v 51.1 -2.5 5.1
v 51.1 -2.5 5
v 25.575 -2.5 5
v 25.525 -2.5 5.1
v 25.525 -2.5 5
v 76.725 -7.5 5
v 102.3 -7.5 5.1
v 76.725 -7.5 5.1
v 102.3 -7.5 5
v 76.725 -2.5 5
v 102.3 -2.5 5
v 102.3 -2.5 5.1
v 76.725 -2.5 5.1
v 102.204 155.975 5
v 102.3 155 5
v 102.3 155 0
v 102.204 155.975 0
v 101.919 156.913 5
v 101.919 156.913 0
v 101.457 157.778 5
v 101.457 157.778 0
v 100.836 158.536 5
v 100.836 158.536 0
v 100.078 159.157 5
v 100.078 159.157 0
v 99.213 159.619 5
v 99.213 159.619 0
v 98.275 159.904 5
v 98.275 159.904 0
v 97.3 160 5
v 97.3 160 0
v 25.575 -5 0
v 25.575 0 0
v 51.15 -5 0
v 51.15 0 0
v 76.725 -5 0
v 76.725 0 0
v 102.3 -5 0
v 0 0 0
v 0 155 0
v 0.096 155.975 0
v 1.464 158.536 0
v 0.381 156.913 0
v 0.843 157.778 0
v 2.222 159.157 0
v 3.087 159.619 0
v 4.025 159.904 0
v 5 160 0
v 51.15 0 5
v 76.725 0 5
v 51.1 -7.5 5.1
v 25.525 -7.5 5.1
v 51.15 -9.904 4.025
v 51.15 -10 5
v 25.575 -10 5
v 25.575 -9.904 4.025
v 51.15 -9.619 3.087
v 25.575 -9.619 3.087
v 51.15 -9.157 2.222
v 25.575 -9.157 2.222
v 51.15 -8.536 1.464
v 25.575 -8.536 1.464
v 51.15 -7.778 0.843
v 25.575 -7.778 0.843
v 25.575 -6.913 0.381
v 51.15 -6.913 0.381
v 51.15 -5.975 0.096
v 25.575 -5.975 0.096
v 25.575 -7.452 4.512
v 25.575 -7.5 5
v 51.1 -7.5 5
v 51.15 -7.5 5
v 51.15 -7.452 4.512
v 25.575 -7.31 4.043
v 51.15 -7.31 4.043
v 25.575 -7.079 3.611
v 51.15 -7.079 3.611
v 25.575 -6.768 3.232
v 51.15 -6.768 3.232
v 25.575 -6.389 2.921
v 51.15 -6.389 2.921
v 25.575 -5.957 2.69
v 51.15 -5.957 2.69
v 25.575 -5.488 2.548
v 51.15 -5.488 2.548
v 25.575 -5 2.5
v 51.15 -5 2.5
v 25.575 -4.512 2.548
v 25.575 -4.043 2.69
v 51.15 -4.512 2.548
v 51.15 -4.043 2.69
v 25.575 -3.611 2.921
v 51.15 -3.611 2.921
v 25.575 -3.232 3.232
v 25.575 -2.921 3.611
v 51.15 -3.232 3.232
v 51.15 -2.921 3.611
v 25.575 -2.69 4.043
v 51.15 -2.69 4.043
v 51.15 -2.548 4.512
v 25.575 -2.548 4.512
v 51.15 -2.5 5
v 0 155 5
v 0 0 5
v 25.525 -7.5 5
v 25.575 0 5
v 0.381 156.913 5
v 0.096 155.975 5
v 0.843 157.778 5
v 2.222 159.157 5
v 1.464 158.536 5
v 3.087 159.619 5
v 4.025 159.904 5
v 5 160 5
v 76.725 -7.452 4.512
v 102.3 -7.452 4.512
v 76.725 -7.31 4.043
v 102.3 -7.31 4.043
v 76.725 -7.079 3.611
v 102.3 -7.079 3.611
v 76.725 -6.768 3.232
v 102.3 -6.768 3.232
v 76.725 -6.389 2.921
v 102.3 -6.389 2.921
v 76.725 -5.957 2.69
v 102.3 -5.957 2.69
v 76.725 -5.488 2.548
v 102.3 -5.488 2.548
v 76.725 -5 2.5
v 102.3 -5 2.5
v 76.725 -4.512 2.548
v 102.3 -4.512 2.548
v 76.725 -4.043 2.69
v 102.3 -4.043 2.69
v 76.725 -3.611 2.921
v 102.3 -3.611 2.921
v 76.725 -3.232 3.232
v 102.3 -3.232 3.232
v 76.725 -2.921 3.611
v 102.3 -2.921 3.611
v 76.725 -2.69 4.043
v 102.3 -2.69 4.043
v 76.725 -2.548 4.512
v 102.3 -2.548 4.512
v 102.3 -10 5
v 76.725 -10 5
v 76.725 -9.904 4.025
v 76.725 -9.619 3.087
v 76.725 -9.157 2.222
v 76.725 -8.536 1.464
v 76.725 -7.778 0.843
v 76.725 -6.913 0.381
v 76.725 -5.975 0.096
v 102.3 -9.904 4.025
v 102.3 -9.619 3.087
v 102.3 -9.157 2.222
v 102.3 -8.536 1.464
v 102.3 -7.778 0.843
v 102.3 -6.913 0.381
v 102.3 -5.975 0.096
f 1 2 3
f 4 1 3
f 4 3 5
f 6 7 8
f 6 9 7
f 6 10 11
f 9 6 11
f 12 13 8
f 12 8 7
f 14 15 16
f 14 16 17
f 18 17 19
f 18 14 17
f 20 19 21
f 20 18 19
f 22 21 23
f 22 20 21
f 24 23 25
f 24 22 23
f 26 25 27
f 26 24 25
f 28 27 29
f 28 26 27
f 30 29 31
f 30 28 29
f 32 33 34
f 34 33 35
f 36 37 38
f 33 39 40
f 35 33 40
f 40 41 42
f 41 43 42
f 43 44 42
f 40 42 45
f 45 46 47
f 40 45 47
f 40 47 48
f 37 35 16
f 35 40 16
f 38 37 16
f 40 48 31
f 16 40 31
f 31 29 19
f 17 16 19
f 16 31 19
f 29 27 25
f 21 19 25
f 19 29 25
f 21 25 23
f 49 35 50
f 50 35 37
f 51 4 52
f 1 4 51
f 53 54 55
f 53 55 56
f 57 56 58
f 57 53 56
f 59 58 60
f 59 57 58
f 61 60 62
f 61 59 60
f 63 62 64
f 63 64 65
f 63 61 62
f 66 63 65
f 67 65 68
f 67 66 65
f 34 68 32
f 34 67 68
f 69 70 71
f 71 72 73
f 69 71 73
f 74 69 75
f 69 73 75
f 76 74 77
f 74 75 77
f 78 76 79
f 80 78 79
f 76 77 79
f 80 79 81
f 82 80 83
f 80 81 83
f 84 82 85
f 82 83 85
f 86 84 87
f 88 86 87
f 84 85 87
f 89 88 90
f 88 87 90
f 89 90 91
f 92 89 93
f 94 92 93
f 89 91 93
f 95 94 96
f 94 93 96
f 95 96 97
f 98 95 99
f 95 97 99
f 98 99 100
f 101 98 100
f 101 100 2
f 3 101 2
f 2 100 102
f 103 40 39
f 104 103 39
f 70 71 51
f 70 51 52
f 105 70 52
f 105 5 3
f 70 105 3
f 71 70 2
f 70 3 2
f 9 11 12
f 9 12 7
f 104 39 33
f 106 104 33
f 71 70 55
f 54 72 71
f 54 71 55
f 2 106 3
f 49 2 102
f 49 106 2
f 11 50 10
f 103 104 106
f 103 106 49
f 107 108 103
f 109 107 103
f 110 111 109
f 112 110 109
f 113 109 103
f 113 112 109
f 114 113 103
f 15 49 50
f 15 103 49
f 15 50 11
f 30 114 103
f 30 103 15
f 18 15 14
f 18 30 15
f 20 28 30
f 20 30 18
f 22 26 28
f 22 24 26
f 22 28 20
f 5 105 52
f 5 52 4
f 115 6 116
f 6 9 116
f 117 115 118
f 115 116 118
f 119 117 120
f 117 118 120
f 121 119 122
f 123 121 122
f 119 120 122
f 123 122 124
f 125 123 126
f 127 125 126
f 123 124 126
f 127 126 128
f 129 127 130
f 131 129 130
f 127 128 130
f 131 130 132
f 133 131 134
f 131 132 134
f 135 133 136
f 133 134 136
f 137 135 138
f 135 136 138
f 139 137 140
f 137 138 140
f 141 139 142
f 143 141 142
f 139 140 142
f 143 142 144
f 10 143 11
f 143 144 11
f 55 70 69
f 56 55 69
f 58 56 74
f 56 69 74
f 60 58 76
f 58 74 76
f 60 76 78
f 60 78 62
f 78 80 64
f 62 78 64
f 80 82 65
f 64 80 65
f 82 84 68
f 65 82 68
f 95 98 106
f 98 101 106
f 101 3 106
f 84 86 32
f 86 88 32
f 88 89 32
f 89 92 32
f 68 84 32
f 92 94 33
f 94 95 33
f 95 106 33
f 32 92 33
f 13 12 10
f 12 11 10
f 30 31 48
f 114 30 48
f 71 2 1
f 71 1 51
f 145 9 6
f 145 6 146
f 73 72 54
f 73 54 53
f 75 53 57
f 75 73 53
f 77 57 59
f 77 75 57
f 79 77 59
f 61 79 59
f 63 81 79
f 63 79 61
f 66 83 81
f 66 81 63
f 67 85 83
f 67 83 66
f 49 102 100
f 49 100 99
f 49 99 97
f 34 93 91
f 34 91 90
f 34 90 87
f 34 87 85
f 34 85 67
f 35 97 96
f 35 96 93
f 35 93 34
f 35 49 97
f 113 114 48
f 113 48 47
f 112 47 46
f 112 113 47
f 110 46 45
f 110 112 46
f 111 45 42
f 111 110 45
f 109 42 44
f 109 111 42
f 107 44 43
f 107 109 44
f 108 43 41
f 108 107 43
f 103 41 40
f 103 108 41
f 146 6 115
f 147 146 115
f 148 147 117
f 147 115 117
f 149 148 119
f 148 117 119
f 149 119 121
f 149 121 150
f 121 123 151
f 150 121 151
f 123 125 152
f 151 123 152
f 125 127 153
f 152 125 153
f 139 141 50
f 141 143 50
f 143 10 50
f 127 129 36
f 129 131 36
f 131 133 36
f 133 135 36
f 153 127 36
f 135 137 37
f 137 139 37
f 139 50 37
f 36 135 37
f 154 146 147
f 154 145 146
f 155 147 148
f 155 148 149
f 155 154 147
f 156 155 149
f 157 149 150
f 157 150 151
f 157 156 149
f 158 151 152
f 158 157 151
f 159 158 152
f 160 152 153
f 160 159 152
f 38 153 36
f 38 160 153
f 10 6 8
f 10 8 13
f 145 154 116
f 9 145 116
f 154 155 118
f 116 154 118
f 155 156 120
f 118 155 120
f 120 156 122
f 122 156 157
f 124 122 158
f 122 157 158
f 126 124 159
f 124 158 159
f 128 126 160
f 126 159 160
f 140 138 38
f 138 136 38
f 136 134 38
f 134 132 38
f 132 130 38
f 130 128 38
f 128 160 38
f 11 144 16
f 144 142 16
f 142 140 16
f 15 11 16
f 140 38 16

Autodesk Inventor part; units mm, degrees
ref_plane "YZ Plane" through (0, 0, 0) normal (1, 0, 0) x (0, 1, 0)
ref_plane "XZ Plane" through (0, 0, 0) normal (0, 1, 0) x (-1, 0, 0)
sketch "Sketch1" plane through (0, 0, 0) normal (0, 0, 1) x (1, 0, 0)
  line L0 (0, 0) -> (102.3, 0)
  line L1 (102.3, 0) -> (102.3, 160)
  line L2 (102.3, 160) -> (0, 160)
  line L3 (0, 160) -> (0, 0)
  dimension "d0" = 160
  dimension "d1" = 102.3
extrude "Extrusion1" add sketch "Sketch1" along normal blind 5
sketch "Sketch3" plane through (102.3, 0, 0) normal (1, 0, 0) x (0, 0, -1)
  line L0 (0, 0) -> (-5, 0)
  line L1 (-5, 0) -> (-5, -5)
  line L2 (-5, -5) -> (0, -5)
  line L3 (0, -5) -> (0, 0)
  arc A0 (-5, -10) -> (-6.25, -0.1588) centre (-5, -5) ccw
  arc A1 (-5, -7.5) -> (-5, -2.5) centre (-5, -5) ccw
  line L4 (-6.25, -2.8349) -> (-6.25, -0.1588)
  line L5 (-5, 0) -> (-5, -10)
  point P0 (-5, -2.5)
  point P1 (-2.5, -5)
  dimension "d11" = 5
  dimension "d12" = 5
  dimension "d13" = 2.5
  dimension "d14" = 1.25
extrude "Extrusion3" add sketch "Sketch3" against normal blind 25.575 contours L3 A0 L0 | A0 L2 A1 L1 | A0 L5 A1 L2
pattern_linear "Rectangular Pattern1" count 2 spacing 51.15 along (-1, 0, 0) of "Extrusion3"
fillet "Fillet1" radius 5 2 edges at (102.3, 160, 2.5) (0, 160, 2.5)
sketch "Sketch6" plane through (102.3, -10, 5) normal (0, 0, 1) x (1, 0, 0)
  point P0 (-102.3, 10)
  point P1 (-12.7875, 1.222)
ref_plane "Work Plane1" through (89.5125, -8.778, 5) normal (0, 0, 1) x (1, 0, 0)
sketch "Sketch7" plane through (89.5125, -8.778, 5) normal (0, 0, 1) x (1, 0, 0)
  line L0 (12.7875, 6.278) -> (-12.7875, 6.278) projected
  line L1 (12.7875, 1.278) -> (-12.7875, 1.278) projected
  line L2 (-12.7875, 6.278) -> (12.7875, 6.278)
  line L3 (12.7875, 6.278) -> (12.7875, 1.278)
  line L4 (12.7875, 1.278) -> (-12.7875, 1.278)
  line L5 (-12.7875, 1.278) -> (-12.7875, 6.278)
  point P0 (-89.5125, 8.778)
extrude "Extrusion6" add sketch "Sketch7" along normal blind 0.1
pattern_linear "Rectangular Pattern2" count 2 spacing 51.2 along (-1, 0, 0) of "Extrusion6"
properties part number "Hinge"
